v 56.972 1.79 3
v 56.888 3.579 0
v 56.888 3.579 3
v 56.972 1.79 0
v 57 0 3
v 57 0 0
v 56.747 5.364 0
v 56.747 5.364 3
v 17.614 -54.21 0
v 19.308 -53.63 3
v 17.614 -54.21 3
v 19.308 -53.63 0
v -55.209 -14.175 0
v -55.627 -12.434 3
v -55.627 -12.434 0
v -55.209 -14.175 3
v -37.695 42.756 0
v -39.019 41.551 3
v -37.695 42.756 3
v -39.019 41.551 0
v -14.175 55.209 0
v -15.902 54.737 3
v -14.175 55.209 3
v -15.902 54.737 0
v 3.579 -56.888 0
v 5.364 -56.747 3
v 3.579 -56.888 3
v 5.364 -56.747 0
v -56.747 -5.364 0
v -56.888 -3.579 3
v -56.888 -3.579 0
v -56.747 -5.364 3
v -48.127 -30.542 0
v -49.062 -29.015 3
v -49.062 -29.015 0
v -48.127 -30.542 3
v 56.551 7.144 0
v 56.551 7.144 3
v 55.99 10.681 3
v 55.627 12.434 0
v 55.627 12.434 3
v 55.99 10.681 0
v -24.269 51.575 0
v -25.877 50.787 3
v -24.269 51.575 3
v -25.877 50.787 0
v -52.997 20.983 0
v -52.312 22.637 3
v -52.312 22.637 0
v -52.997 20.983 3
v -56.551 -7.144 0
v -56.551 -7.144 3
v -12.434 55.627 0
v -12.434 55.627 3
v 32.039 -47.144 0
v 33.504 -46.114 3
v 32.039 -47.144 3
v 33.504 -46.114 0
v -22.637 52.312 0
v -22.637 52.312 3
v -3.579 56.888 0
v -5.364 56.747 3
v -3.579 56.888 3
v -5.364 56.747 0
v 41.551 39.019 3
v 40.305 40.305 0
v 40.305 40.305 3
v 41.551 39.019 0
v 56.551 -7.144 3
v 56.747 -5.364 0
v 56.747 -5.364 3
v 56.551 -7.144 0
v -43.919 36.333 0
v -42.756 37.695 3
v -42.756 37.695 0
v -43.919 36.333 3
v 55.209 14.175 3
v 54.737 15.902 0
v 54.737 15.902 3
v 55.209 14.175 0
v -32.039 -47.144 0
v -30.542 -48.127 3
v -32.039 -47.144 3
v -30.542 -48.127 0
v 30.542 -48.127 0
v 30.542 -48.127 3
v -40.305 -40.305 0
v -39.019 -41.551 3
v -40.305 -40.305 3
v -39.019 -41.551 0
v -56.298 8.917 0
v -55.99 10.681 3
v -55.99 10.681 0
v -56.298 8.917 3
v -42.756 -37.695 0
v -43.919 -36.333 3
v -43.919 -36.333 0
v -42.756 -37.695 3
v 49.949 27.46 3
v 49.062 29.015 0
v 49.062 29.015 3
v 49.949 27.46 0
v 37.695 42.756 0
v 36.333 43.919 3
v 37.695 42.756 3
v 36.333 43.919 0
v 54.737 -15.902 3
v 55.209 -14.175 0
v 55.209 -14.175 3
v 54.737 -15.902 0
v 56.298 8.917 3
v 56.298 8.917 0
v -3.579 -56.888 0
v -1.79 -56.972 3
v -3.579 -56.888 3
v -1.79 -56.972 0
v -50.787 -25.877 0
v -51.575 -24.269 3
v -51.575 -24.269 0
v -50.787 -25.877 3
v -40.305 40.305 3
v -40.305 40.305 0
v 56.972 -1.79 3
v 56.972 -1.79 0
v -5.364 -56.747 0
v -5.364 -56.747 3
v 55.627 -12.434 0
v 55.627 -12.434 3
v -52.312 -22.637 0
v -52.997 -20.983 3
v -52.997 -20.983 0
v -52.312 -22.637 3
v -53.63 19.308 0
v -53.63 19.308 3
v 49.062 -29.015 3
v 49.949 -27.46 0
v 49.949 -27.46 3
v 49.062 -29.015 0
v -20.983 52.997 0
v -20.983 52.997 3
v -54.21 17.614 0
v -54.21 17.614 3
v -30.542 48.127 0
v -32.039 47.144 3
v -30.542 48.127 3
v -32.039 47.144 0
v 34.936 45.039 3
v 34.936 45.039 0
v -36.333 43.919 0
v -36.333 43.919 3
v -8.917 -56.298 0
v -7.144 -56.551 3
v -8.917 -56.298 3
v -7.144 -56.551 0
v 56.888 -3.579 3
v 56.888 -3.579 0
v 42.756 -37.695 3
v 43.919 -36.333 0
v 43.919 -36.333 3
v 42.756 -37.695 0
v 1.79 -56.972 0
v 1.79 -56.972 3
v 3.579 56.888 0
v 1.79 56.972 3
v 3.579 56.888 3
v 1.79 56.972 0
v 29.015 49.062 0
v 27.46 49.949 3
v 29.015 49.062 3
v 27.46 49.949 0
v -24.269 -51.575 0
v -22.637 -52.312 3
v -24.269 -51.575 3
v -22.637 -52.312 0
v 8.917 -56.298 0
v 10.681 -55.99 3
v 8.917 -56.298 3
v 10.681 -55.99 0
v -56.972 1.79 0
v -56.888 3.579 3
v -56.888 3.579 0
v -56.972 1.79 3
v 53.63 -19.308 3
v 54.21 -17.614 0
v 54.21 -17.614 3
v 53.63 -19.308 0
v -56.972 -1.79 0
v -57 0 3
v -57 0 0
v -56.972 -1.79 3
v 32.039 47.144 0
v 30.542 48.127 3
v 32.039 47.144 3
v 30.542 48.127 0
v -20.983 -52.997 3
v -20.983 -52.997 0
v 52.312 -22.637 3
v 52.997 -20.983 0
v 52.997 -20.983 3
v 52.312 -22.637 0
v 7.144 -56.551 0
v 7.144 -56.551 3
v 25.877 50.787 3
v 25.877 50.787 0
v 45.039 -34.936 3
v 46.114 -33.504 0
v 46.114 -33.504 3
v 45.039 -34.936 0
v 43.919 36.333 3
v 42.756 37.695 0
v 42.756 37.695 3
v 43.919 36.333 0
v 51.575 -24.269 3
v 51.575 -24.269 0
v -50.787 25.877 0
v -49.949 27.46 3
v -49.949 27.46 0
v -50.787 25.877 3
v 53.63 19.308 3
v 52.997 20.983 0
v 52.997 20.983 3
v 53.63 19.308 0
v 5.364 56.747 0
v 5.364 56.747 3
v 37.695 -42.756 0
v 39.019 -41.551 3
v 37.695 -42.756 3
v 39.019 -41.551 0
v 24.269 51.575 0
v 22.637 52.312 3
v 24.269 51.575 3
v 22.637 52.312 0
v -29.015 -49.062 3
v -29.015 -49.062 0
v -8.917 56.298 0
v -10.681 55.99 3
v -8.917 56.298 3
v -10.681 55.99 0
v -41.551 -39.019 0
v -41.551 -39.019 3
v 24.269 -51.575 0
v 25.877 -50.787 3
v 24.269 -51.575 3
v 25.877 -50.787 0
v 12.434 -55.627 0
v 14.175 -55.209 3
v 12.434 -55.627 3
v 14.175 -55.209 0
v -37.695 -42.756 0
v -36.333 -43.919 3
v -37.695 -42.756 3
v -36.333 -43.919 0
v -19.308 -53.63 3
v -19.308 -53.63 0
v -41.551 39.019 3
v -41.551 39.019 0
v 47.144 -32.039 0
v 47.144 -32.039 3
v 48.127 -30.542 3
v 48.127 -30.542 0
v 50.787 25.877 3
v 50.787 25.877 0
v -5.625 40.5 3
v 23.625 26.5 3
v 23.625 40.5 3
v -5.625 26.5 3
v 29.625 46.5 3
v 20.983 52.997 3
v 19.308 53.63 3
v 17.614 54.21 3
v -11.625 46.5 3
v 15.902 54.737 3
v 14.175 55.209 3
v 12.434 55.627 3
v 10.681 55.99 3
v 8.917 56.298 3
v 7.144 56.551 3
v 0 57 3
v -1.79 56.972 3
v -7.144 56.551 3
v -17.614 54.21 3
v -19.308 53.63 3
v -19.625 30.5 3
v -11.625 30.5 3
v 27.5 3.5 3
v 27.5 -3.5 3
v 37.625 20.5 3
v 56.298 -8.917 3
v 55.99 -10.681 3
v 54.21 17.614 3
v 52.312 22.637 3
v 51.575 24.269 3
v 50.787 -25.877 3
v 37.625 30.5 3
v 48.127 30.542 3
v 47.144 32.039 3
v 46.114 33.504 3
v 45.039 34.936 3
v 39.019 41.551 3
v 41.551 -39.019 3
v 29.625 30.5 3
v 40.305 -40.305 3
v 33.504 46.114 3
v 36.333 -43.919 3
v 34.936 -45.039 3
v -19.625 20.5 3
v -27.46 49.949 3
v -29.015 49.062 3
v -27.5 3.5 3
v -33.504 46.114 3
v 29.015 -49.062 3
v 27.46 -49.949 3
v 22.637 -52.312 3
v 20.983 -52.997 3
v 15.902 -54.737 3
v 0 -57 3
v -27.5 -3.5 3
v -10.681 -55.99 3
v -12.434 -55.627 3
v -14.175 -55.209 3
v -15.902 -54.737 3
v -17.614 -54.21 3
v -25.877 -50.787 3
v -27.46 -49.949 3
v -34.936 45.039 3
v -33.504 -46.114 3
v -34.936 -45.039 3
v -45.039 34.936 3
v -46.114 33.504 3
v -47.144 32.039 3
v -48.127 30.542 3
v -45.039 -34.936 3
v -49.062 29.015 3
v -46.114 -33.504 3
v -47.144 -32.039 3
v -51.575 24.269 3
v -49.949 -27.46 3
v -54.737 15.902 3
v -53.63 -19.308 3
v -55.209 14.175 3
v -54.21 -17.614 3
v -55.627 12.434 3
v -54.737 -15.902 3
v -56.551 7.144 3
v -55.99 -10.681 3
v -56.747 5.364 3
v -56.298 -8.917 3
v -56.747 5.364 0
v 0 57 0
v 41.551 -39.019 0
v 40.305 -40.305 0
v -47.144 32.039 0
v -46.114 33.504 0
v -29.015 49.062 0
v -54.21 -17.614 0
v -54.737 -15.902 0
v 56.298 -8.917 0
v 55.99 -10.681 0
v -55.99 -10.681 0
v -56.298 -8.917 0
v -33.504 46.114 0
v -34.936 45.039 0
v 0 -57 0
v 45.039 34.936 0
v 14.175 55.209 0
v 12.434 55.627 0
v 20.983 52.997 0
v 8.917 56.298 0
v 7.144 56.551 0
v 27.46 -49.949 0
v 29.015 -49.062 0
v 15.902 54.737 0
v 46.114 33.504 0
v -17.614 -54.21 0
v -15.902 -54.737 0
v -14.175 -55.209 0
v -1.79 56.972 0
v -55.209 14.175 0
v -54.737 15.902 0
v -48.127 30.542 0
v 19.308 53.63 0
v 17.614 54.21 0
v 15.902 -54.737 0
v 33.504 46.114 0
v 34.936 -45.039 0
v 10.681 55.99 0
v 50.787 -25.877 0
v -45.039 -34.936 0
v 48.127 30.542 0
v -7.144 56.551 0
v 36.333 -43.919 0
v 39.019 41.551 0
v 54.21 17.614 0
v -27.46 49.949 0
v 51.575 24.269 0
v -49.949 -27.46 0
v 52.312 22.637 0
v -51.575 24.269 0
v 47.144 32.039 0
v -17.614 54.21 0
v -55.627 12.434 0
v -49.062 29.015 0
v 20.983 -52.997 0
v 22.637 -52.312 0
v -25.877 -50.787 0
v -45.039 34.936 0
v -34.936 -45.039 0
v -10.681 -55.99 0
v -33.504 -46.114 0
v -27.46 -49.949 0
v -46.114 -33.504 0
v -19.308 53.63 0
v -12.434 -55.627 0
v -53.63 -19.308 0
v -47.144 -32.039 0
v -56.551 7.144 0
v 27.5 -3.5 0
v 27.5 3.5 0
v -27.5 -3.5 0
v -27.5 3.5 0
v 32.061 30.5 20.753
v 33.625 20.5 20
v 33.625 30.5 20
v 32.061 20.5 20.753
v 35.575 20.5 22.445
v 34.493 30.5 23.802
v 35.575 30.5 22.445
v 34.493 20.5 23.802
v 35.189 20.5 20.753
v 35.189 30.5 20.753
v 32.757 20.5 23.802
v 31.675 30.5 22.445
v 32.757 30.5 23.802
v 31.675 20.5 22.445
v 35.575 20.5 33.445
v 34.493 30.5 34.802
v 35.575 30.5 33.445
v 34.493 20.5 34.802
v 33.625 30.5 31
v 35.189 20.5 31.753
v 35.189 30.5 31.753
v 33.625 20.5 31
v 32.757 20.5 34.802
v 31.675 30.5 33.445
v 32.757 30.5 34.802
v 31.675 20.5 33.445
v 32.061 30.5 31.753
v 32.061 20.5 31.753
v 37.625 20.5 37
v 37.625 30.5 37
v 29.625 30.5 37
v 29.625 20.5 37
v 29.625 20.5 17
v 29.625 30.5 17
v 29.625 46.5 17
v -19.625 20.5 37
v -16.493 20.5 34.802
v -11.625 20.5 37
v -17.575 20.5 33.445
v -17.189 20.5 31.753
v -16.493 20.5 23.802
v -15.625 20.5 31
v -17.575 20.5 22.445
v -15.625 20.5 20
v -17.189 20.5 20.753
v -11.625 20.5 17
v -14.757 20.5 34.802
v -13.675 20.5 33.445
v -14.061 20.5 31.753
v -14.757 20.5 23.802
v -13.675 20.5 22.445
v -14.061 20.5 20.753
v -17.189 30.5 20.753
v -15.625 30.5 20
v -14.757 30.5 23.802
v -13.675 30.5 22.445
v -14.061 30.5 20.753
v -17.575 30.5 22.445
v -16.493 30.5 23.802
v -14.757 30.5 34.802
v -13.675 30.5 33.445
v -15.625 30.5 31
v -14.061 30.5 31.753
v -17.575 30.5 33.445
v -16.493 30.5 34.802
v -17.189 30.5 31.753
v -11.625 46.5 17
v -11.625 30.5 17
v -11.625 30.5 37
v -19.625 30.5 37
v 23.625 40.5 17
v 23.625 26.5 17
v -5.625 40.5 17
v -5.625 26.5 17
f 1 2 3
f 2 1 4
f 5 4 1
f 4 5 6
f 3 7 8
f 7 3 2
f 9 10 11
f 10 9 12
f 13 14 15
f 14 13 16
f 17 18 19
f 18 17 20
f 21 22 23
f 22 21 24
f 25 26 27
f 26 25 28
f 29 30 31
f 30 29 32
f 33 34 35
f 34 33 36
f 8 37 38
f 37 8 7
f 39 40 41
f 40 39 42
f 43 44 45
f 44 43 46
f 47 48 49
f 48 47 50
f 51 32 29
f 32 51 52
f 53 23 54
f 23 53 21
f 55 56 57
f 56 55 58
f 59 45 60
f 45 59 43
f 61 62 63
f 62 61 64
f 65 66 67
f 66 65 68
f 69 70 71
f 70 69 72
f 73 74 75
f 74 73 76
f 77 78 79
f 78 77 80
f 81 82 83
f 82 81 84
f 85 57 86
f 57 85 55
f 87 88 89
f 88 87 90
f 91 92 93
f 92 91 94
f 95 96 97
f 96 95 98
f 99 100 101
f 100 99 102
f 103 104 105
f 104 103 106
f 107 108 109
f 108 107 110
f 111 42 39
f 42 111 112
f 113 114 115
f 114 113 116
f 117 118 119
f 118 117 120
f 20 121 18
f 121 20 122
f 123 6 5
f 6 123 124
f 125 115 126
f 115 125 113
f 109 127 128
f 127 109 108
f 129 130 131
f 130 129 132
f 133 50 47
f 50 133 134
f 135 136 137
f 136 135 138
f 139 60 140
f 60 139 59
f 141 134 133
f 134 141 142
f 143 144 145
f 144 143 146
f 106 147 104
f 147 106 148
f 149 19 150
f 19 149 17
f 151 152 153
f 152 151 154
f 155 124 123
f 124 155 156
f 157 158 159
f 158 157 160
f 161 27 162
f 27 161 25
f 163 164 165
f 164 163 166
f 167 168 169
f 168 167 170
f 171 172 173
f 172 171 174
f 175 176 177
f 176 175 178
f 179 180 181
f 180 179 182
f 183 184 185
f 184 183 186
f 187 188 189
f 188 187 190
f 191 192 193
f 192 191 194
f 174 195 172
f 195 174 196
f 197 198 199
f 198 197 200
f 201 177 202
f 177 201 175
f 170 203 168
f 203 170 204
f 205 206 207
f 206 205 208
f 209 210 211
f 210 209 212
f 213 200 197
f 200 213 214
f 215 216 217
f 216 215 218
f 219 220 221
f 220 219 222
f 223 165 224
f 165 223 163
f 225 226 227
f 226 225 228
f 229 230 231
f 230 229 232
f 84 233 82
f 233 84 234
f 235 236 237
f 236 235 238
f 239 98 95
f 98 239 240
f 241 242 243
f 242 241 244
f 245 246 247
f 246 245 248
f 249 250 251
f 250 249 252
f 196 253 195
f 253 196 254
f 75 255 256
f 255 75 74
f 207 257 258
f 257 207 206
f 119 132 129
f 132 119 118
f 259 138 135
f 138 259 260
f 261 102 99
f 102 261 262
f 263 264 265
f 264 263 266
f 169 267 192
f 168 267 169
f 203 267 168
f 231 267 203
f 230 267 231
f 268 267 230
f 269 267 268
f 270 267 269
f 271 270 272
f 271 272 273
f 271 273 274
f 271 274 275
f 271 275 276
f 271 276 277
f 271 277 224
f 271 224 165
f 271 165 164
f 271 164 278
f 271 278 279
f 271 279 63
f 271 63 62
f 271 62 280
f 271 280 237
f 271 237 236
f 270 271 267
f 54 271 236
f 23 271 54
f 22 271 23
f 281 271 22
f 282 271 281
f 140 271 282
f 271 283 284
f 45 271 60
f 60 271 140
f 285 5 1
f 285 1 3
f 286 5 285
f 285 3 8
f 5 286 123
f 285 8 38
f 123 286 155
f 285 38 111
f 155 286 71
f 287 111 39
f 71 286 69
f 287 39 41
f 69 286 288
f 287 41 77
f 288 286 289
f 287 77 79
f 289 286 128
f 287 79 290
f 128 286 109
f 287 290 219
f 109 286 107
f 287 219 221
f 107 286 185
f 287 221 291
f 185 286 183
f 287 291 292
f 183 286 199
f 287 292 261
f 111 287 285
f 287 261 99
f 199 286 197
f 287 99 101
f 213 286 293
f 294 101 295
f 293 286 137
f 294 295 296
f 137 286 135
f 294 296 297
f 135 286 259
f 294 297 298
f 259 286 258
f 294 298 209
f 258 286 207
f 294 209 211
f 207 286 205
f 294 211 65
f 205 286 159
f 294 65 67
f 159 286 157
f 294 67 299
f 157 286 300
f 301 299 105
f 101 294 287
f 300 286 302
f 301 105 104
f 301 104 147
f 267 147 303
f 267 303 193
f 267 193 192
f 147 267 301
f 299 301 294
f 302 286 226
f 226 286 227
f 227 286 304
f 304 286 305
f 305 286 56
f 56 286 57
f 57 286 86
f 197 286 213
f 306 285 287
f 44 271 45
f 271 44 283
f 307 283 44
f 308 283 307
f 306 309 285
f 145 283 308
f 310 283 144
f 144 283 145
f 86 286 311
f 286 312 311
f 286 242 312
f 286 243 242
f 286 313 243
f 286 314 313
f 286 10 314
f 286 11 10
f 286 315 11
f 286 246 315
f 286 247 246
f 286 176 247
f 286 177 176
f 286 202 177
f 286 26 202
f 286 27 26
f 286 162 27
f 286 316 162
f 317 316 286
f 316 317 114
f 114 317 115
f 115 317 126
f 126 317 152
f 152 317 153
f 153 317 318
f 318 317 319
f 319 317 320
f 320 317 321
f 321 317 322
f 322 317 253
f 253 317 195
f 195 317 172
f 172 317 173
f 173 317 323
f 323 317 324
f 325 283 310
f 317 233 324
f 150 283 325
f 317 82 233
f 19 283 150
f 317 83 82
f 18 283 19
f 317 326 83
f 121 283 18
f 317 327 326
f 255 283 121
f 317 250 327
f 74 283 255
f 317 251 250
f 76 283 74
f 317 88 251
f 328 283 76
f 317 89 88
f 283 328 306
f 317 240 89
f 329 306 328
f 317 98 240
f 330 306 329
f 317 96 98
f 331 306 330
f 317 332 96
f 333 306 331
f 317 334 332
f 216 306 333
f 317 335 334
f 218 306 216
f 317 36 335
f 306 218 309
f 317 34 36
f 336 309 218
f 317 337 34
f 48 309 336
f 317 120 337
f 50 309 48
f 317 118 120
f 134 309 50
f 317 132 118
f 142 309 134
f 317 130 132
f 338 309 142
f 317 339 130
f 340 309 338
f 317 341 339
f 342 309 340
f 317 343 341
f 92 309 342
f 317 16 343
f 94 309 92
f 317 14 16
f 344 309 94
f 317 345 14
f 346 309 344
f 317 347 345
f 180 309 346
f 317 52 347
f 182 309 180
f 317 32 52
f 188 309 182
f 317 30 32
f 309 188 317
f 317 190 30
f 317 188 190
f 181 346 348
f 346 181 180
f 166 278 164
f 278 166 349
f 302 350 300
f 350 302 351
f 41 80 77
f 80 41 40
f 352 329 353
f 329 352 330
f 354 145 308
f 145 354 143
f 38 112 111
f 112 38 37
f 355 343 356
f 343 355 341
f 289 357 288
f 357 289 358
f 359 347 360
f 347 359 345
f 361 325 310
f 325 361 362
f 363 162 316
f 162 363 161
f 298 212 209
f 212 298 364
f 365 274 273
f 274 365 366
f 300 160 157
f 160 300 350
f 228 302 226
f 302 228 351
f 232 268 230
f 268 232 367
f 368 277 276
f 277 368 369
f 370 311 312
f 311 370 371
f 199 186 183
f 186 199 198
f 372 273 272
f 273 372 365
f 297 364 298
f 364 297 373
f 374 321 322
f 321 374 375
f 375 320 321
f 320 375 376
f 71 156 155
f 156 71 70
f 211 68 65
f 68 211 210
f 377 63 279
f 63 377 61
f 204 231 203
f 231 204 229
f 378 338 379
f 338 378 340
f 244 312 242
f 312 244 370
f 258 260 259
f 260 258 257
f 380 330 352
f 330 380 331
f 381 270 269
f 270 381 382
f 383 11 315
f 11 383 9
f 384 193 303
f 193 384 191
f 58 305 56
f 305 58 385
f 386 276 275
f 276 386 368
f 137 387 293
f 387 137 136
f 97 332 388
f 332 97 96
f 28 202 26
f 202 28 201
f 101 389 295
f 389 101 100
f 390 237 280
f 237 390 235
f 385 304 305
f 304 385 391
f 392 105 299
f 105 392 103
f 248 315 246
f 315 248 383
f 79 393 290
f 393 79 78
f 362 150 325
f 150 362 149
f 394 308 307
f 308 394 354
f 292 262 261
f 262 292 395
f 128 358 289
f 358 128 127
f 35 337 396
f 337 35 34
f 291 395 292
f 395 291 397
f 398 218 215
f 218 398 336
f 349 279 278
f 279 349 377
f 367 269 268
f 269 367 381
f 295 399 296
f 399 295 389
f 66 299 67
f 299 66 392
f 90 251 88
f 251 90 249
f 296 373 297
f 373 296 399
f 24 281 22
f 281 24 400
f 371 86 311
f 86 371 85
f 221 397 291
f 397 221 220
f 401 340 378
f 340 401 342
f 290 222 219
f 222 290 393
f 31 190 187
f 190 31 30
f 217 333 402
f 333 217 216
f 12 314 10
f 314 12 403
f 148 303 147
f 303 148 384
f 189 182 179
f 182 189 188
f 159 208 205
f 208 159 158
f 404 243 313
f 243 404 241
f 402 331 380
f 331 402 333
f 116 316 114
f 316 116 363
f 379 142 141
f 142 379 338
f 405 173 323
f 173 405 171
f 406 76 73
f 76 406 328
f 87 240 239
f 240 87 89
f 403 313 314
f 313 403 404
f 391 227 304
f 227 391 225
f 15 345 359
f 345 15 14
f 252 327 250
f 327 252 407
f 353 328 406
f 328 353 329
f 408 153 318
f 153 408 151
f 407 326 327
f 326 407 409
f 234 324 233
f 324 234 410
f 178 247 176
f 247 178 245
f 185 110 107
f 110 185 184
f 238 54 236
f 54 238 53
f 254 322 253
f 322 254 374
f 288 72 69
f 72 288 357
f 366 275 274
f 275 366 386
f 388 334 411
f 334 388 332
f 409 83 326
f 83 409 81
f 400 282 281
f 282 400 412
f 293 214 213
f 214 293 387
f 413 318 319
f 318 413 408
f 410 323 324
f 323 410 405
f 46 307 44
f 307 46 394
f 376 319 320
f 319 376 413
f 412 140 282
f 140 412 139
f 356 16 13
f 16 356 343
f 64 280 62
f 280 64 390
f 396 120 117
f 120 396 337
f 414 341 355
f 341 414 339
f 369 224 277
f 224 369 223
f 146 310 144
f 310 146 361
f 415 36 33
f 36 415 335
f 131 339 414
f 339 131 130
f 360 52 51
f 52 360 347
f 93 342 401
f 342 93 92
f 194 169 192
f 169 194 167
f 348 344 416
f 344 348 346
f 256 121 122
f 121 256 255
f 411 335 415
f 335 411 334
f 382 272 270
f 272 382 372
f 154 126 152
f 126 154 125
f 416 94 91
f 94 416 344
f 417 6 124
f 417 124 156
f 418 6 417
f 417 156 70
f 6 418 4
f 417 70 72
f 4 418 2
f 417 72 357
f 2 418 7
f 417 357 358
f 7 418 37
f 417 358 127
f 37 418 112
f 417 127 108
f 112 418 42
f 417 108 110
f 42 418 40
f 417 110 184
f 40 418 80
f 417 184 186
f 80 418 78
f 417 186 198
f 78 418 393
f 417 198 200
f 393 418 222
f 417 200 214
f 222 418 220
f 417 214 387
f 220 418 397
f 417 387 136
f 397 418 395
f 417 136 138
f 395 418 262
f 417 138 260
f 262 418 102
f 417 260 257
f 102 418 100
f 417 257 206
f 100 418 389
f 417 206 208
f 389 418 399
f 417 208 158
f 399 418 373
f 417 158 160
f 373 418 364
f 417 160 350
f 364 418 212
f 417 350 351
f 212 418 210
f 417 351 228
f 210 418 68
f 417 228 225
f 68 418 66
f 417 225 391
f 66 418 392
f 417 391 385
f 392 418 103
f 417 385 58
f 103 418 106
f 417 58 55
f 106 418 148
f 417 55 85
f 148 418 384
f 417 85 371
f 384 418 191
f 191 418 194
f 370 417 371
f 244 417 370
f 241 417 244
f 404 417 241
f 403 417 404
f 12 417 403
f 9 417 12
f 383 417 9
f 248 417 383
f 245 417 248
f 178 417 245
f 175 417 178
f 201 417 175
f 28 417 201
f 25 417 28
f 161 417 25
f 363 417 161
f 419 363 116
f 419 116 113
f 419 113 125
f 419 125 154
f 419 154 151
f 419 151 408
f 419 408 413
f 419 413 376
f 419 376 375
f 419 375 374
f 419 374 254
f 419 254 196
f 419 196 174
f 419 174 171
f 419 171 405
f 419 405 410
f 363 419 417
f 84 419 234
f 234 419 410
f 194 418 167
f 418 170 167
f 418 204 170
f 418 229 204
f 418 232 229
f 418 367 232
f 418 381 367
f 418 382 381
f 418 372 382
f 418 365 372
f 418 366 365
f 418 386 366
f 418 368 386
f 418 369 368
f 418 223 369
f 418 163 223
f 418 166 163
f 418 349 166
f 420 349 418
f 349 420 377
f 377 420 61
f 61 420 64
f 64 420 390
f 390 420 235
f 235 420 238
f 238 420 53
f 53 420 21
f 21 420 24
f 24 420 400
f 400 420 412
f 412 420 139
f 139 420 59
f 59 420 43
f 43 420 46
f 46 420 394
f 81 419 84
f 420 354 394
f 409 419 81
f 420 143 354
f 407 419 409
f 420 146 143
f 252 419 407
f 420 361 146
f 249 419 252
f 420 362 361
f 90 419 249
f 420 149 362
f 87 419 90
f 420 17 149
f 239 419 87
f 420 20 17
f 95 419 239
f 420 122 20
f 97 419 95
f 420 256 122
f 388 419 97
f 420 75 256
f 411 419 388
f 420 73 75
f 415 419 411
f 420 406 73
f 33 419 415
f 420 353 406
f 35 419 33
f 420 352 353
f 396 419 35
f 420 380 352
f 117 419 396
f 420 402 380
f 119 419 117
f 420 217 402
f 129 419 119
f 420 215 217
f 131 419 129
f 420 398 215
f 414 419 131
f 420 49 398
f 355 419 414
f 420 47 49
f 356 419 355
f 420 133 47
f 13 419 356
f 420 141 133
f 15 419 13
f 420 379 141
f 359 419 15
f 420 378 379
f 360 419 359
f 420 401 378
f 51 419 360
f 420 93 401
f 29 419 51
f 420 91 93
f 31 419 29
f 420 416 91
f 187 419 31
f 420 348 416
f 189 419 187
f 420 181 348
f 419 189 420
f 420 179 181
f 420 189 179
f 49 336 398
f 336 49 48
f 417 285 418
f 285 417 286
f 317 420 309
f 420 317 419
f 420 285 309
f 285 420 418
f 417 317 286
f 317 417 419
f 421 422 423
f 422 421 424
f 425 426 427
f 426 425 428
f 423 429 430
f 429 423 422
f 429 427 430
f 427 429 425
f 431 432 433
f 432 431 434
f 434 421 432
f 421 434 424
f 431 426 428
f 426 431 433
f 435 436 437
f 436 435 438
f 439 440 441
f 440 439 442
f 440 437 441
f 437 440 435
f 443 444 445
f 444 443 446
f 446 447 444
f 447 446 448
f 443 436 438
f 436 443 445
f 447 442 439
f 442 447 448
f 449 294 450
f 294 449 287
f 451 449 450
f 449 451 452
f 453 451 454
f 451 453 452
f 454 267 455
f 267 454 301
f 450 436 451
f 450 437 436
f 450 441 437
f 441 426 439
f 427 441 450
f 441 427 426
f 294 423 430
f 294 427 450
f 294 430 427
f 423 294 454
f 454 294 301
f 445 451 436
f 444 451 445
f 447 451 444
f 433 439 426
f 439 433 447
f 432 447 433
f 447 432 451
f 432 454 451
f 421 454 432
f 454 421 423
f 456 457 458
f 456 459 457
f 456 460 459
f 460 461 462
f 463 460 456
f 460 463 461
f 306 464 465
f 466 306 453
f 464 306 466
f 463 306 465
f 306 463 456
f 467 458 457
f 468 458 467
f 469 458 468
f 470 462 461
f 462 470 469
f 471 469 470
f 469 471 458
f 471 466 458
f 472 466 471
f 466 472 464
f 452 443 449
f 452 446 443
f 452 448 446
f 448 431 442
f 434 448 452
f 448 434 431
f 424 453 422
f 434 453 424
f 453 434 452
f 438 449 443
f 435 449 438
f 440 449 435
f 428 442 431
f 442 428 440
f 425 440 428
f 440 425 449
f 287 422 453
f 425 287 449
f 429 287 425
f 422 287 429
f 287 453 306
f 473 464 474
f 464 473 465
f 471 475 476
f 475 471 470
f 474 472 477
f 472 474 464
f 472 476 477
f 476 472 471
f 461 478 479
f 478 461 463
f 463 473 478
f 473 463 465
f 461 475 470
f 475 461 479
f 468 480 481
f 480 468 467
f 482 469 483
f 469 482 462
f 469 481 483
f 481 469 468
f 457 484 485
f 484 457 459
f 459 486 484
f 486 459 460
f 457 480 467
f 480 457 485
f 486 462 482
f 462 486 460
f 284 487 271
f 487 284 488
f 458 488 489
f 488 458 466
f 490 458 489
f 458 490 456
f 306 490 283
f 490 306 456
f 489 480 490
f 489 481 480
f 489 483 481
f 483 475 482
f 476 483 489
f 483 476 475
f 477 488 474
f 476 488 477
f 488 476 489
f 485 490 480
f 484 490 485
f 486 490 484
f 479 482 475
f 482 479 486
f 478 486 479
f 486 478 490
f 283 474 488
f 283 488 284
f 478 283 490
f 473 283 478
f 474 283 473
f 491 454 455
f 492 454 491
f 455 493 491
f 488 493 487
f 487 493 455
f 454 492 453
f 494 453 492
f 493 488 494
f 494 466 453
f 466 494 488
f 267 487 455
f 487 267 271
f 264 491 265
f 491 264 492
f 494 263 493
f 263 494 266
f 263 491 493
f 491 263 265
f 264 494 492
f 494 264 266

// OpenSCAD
use <MCAD/shapes.scad>

/*params*/{
baseheight=3;
baseradius=57;

baseholewidth=55;
baseholeheight=7;

baseservoholeradius=6.75;
baseservoholeoffset=20;

axialrestrictorouterplatewidth=18;
axialrestrictorouterplateheight=10;
axialrestrictorouterplatedepth=3;

axialrestrictorinnerplatewidth=18;
axialrestrictorinnerplateheight=7;
axialrestrictorinnerplatedepth=3.6;

axialrestrictorholewidth=6;
axialrestrictorholeheight=4;

gaittrustorservomountdiameter=9;
gaittrustorservomountheight=6;

fudgefactor=0.5;
gaittrustorlength=70;

axialrestrictorscrewholeoffset=6;
screwholediameter=3.5;

servomountheight=14;
//why does the servo measure up to 40.5?!
servomountlength=40.75+fudgefactor;
servomountwidth=26;

servomountholeoffset=12;

largenumber=100;


uppermountwidth=8;
uppermountlength=10;
uppermountheight=20;

uppermountholediam=4;
uppermountholeoffsetx=5;
uppermountholeoffsety=4;

uppermountupperholeoffsetx=11;

xoffsetservomount=baseholeheight/2+17;
yoffsetservomount=servomountlength/2-9;


}

/*init*/{
//gaittrustor();
//translate([0,20,0])
//axialmotionrestrictor(true);

//axialmotionrestrictor(false);

//baseplate_test();



union(){
baseplate();



translate([-yoffsetservomount,xoffsetservomount,baseheight])
servomount();
}
}

module baseplate(){
//difference(){
	difference() {
 cylinder(r=baseradius,h=baseheight, $fn=200);
cube([baseholewidth, baseholeheight, baseholeheight], center = true);
}

//translate([0, baseservoholeoffset, 0])
//cylinder(r=baseservoholeradius,h=baseholeheight);
//}
}

module baseplate_test(){

	difference() {

 cube([baseholewidth+10, baseholeheight+10, baseheight], center = true);
 
 
cube([baseholewidth, baseholeheight, baseholeheight], center = true);
}

}

module axialmotionrestrictor(drawCenterPiece){



axialrestrictorholewidth=6;
axialrestrictorholeheight=4;


difference() {

difference()
{

union()
{

cube([axialrestrictorouterplatewidth, axialrestrictorouterplateheight, axialrestrictorouterplatedepth], center = true);

if(drawCenterPiece)
	{
	translate([0, 0, axialrestrictorouterplatedepth])
	cube([axialrestrictorinnerplatewidth, axialrestrictorinnerplateheight, axialrestrictorinnerplatedepth], center = true);
	}
}

cube([axialrestrictorholewidth, axialrestrictorholeheight, largenumber], center = true);

}
translate([axialrestrictorscrewholeoffset, 0, 0])
cylinder(r=screwholediameter/2,h= largenumber,center=true);

translate([-axialrestrictorscrewholeoffset, 0, 0])
cylinder(r=screwholediameter/2,h= largenumber,center=true);

}


}

module gaittrustor(){

difference()
	{

	union()
		{

		cube([gaittrustorlength, axialrestrictorholewidth-fudgefactor,axialrestrictorholeheight-fudgefactor], center = true);

		translate([gaittrustorlength/2,0,-(axialrestrictorholeheight-fudgefactor)/2])
			{
				cylinder(r=gaittrustorservomountdiameter/2,h= gaittrustorservomountheight,center=false);
			}

		}
		
			translate([gaittrustorlength/2,0,-(axialrestrictorholeheight-fudgefactor)/2])
	{
		cylinder(r=screwholediameter/2,h= largenumber,center=true);
	}
	}
	

}

module servomountpillar(){



difference(){



cube([uppermountwidth,uppermountlength,servomountheight+uppermountheight]);



union(){
translate([uppermountwidth/2,largenumber/2,servomountheight+uppermountholeoffsetx])
rotate([90,90,0])
cylinder(r=uppermountholediam/2,h=largenumber);

translate([uppermountwidth/2,largenumber/2,servomountheight+uppermountholeoffsetx+uppermountupperholeoffsetx])
rotate([90,90,0])
cylinder(r=uppermountholediam/2,h=largenumber);

}


}

}

module servomount(){


union(){
translate([servomountlength,0,0])
servomountpillar();

translate([-uppermountwidth,0,0])
servomountpillar();

difference(){
cube([servomountlength,servomountwidth,servomountheight]);

translate([servomountholeoffset/2,servomountholeoffset/2,0])
cube([servomountlength-servomountholeoffset,servomountwidth-servomountholeoffset,servomountheight]);
}
}
}
